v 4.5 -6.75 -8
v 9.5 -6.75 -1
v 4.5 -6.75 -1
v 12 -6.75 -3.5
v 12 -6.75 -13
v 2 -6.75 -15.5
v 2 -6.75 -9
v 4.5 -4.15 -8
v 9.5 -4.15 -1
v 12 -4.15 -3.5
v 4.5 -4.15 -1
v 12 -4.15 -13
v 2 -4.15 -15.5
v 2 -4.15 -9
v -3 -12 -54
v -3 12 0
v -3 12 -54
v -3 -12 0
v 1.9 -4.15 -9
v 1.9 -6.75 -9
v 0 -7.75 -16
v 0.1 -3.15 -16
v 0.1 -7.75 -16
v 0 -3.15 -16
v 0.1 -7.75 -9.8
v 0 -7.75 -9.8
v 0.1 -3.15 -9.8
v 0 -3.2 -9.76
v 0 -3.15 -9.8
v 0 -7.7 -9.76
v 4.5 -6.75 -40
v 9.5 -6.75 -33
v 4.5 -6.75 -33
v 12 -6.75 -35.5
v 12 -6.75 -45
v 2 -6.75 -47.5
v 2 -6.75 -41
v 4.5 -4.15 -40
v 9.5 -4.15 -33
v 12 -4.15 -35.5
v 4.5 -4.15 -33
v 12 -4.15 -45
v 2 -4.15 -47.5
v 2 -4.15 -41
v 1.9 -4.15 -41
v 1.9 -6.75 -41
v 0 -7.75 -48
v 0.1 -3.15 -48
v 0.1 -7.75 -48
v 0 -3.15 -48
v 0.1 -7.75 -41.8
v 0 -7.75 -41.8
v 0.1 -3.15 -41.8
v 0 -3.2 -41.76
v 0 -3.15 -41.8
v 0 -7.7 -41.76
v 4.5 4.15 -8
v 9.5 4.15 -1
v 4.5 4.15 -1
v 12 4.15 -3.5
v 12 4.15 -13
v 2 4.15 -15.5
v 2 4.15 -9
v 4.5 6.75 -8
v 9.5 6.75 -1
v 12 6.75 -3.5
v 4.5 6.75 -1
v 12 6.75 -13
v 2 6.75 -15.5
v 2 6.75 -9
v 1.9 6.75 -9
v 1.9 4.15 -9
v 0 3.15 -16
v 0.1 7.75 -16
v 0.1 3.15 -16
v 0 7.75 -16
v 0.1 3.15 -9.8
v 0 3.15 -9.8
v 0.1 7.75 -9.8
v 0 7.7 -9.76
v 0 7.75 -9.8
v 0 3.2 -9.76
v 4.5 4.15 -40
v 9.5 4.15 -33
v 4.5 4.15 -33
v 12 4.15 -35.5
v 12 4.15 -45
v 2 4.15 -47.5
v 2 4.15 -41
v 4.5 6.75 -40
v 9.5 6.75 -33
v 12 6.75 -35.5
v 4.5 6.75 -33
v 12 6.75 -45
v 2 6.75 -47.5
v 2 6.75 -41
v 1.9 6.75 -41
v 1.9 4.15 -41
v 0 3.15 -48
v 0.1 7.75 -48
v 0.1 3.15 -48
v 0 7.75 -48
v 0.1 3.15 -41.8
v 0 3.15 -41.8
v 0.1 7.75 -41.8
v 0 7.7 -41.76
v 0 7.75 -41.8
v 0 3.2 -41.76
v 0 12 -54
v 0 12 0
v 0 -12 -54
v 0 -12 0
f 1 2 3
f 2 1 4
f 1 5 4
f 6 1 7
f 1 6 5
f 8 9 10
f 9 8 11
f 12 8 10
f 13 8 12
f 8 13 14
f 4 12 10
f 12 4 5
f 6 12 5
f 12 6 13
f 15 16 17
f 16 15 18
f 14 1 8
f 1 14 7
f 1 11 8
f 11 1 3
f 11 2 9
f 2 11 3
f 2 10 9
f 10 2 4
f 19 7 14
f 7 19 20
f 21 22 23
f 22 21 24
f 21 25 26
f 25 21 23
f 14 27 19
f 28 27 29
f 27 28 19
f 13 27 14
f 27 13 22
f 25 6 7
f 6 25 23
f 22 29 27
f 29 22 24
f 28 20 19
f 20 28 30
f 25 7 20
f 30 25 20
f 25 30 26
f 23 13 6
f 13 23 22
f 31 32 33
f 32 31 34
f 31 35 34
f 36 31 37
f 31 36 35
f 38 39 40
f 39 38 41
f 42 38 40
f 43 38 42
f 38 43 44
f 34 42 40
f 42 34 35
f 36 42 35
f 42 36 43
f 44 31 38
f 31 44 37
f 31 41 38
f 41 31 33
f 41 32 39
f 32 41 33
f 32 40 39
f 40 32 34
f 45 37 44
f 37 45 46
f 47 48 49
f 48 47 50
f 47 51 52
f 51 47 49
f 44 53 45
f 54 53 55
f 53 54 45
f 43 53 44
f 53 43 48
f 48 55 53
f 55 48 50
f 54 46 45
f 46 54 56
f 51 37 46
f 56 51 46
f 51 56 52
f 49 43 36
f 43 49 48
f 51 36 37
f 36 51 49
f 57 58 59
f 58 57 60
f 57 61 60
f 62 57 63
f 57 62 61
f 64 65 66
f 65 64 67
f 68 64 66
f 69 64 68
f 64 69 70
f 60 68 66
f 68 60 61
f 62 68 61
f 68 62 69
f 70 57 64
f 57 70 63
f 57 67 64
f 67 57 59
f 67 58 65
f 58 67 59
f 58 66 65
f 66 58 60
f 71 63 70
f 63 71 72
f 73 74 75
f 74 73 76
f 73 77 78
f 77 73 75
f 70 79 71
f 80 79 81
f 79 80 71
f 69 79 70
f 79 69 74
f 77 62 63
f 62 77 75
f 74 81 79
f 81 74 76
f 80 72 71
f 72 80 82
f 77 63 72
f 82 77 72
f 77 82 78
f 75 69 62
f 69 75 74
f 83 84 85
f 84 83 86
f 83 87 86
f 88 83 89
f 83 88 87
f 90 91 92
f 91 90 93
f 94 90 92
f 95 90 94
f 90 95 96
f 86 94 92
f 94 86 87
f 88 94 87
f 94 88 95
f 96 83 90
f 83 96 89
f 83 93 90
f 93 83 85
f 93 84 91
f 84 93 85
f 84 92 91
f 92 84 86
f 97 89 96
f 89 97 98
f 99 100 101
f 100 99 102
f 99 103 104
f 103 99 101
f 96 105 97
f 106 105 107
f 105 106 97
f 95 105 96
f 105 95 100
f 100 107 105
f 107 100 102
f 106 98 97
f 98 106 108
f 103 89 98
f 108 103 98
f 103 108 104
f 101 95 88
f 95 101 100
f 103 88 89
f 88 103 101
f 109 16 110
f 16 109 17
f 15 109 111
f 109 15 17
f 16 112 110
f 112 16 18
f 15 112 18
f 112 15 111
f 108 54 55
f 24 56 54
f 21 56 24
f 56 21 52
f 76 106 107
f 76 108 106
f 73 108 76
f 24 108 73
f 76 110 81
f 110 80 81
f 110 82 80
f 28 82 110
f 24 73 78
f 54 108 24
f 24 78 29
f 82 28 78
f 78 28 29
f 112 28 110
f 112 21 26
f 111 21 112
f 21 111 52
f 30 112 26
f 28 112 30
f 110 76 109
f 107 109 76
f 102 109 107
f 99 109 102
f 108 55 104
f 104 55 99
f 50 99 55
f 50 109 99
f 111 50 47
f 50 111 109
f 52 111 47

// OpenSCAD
/*
    Elfa Shelf Bracket SCAD model
    Author: Tony Jadid

    This OpenSCAD script generates an Elfa-compatible shelf bracket
    designed to fit standard Elfa wall rails with a reinforced backplate.

    Features:
    - Adjustable number of vertical hook columns and spacing between them.
    - Parametric hook geometry for inner/outside hook distance, depth, height,
      and notch placement.
    - Calculated hook height based on Elfa pitch and clearance gap.
    - Optional 3D measurement text for quick dimensional validation.
    - Configurable foundation fillet to improve slicer layer adhesion,
      reducing stress on thin hook joints.
    - Dual hook columns are created for each rail to provide a stiff,
      reinforced bracket structure.

    The model uses a 2D hook profile extruded across the hook width, then
    optionally adds a smooth tapered base foundation to merge with the backplate.
*/

/* [Orientation] */
model_rotation_x = 180; // [-360:1:360]
model_rotation_y = 0; // [-360:1:360]
model_rotation_z = 90; // [-360:1:360]

/* [Horizontal Layout] */
number_of_columns = 1;            // Number of vertical standards (skenor) to mount to
column_spacing_x = 85;            // Center-to-center distance between the columns (mm)

/* [Elfa Slot Spacing (Horizontal)] */
// Avstånd mellan insidorna på de två krokarna (mm)
tooth_inner_distance = 8.3;  
// Avstånd mellan utsidorna på de två krokarna (mm)
tooth_outer_distance = 13.5;  

/* [Information Display] */
// Visa uträknade mått som 3D-text ovanför modellen (stäng av innan utskrift)
show_measurement_text = false;

/* [Elfa Mount Settings] */
number_of_teeth = 2;              // Number of teeth (vertical hooks) per column
bracket_width_per_column = 24;    // The base width of the backplate covering one column group
backplate_thickness = 3;

/* [Strength Optimization] */
// How deep the hooks penetrate interiorly (mm)
tooth_embed_depth = 3;     
// Chamfer/fillet radius at the base of the hook inside the backplate (mm)
tooth_root_chamfer = 2.5;    

/* [Slicer Layer Overlap Optimization] */
// To prevent the slicer from creating a weak flat layer joint, a 3D foundation taper forces intersecting perimeters.
hook_base_width_fillet = 1;     // Taper lateral width left/right (adds total width at surface)
hook_base_height_fillet = 0;  // Taper vertically up/down along the backplate
hook_base_fillet_depth = 2;   // Length of taper transitioning outwards into the main hook

/* [Spacing & Height] */
tooth_pitch_y = 32;           // Standard Elfa pitch vertically (Center-to-Center distance)
tooth_vertical_offset = 1;   // Distance from bottom of bracket to first tooth
bracket_top_margin = 21;      // Margin above the top tooth

/* [Hook Profile (Elfa Style)] */
tooth_depth = 12;             // Depth penetrating the wall standard
tooth_top_y_front = 15;       // Front top height of the hook
tooth_top_y_back = 12;        // Sloped rear top height for insertion
tooth_gap_size = 20;          // Avståndet MELLAN en tands botten och nästa tands topp
notch_depth = 4.5;              // Clearance for standard wall thickness
notch_distance_from_bottom = 7; // Avstånd från krokens lägsta spets upp till hacket (vilar på skenan)
base_bottom_y = 8.8;            // Bottom angle thickness matching notch
hook_tip_chamfer = 2.5;       // Angled tip for smoother insertion

/* [Appearance] */
bracket_color = "#4682B4"; // SteelBlue
text_color = "#FFFFFF";    // White

// --- Calculations ---
tooth_width = (tooth_outer_distance - tooth_inner_distance) / 2;
calculated_tooth_pitch_x = tooth_inner_distance + tooth_width;

// Räkna ut totala höjden på tanden baserat på pitch och gap
calculated_tooth_total_height = tooth_pitch_y - tooth_gap_size;

// Auto-calculate structural dimensions
bracket_height = tooth_vertical_offset + ((number_of_teeth - 1) * tooth_pitch_y) + bracket_top_margin;
total_bracket_width = (number_of_columns - 1) * column_spacing_x + bracket_width_per_column;

rotate([model_rotation_x, model_rotation_y, model_rotation_z]) {
    if (show_measurement_text) {
        color(text_color)
        translate([0, 0, bracket_height + 5])
        rotate([90, 0, 0])
        linear_extrude(1)
        union() {
            text(str("Tandens Bredd: ", tooth_width, " mm"), size = 2.5, halign = "center", valign = "bottom");
            translate([0, -4, 0])
                text(str("Beraknad Tandhojd: ", calculated_tooth_total_height, " mm"), size = 2.5, halign = "center", valign = "bottom");
        }
    }

    color(bracket_color)
    union() {
        // Main solid support backplate spanning across all columns
        translate([-total_bracket_width/2, -backplate_thickness, 0])
            cube([total_bracket_width, backplate_thickness, bracket_height]);

        // Generate hook groups for each column
        for (col = [0 : number_of_columns - 1]) {
            x_col_offset = (col - (number_of_columns - 1) / 2) * column_spacing_x;
            
            translate([x_col_offset, 0, 0]) {
                // Left reinforced tooth column
                translate([-calculated_tooth_pitch_x/2, 0, 0])
                    tooth_column();

                // Right reinforced tooth column
                translate([calculated_tooth_pitch_x/2, 0, 0])
                    tooth_column();
            }
        }
    }
}

module tooth_column() {
    // Lägsta punkten på kroken i förhållande till toppkanten i Y (Depth)
    hook_bottom_z = tooth_top_y_back - calculated_tooth_total_height;
    // Uträknat Z-värde för hacket baserat på avståndet från krokens botten
    actual_notch_z = hook_bottom_z + notch_distance_from_bottom;
    
    for (i = [0 : number_of_teeth - 1]) {
        z_pos = tooth_vertical_offset + (i * tooth_pitch_y);
        
        translate([0, 0, z_pos]) {
            // 1. The core constant-thickness hook profile
            // Polygon X -> Depth (Y), Polygon Y -> Height (Z)
            rotate([90, 0, 90])
            linear_extrude(height=tooth_width, center=true)
            polygon([
                [-tooth_embed_depth, base_bottom_y - tooth_root_chamfer], 
                [0, base_bottom_y],                                       
                [notch_depth, actual_notch_z],                              
                [notch_depth, hook_bottom_z],                               
                [tooth_depth - hook_tip_chamfer, hook_bottom_z],            
                [tooth_depth, hook_bottom_z + hook_tip_chamfer],            
                [tooth_depth, tooth_top_y_back],                          
                [0, tooth_top_y_front],                                   
                [-tooth_embed_depth, tooth_top_y_front + tooth_root_chamfer] 
            ]);
            
            // 2. The 3D Tapered Foundation for Slicer Adhesion
            // Gradually slopes from a widened base footprint down to the bare hook shape.
            if (hook_base_fillet_depth > 0) {
                y_target = hook_base_fillet_depth;
                
                // Interpolate matching heights to follow the exact slopes of the hook profile
                t_bottom = y_target / notch_depth;
                z_bottom_taper = base_bottom_y * (1 - t_bottom) + actual_notch_z * t_bottom;
                
                t_top = y_target / tooth_depth;
                z_top_taper = tooth_top_y_front * (1 - t_top) + tooth_top_y_back * t_top;
                
                hull() {
                    // Wide foundation base deeply bonded with the backplate surface
                    rotate([90, 0, 90])
                    linear_extrude(height=tooth_width + hook_base_width_fillet*2, center=true)
                    polygon([
                        [-0.1, base_bottom_y - hook_base_height_fillet],
                        [0.1, base_bottom_y - hook_base_height_fillet],
                        [0.1, tooth_top_y_front + hook_base_height_fillet],
                        [-0.1, tooth_top_y_front + hook_base_height_fillet]
                    ]);
                    
                    // Merging smoothly into the exact hook dimensions at 'y_target'
                    rotate([90, 0, 90])
                    linear_extrude(height=tooth_width, center=true)
                    polygon([
                        [y_target - 0.1, z_bottom_taper],
                        [y_target, z_bottom_taper],
                        [y_target, z_top_taper],
                        [y_target - 0.1, z_top_taper]
                    ]);
                }
            }
        }
    }
}
